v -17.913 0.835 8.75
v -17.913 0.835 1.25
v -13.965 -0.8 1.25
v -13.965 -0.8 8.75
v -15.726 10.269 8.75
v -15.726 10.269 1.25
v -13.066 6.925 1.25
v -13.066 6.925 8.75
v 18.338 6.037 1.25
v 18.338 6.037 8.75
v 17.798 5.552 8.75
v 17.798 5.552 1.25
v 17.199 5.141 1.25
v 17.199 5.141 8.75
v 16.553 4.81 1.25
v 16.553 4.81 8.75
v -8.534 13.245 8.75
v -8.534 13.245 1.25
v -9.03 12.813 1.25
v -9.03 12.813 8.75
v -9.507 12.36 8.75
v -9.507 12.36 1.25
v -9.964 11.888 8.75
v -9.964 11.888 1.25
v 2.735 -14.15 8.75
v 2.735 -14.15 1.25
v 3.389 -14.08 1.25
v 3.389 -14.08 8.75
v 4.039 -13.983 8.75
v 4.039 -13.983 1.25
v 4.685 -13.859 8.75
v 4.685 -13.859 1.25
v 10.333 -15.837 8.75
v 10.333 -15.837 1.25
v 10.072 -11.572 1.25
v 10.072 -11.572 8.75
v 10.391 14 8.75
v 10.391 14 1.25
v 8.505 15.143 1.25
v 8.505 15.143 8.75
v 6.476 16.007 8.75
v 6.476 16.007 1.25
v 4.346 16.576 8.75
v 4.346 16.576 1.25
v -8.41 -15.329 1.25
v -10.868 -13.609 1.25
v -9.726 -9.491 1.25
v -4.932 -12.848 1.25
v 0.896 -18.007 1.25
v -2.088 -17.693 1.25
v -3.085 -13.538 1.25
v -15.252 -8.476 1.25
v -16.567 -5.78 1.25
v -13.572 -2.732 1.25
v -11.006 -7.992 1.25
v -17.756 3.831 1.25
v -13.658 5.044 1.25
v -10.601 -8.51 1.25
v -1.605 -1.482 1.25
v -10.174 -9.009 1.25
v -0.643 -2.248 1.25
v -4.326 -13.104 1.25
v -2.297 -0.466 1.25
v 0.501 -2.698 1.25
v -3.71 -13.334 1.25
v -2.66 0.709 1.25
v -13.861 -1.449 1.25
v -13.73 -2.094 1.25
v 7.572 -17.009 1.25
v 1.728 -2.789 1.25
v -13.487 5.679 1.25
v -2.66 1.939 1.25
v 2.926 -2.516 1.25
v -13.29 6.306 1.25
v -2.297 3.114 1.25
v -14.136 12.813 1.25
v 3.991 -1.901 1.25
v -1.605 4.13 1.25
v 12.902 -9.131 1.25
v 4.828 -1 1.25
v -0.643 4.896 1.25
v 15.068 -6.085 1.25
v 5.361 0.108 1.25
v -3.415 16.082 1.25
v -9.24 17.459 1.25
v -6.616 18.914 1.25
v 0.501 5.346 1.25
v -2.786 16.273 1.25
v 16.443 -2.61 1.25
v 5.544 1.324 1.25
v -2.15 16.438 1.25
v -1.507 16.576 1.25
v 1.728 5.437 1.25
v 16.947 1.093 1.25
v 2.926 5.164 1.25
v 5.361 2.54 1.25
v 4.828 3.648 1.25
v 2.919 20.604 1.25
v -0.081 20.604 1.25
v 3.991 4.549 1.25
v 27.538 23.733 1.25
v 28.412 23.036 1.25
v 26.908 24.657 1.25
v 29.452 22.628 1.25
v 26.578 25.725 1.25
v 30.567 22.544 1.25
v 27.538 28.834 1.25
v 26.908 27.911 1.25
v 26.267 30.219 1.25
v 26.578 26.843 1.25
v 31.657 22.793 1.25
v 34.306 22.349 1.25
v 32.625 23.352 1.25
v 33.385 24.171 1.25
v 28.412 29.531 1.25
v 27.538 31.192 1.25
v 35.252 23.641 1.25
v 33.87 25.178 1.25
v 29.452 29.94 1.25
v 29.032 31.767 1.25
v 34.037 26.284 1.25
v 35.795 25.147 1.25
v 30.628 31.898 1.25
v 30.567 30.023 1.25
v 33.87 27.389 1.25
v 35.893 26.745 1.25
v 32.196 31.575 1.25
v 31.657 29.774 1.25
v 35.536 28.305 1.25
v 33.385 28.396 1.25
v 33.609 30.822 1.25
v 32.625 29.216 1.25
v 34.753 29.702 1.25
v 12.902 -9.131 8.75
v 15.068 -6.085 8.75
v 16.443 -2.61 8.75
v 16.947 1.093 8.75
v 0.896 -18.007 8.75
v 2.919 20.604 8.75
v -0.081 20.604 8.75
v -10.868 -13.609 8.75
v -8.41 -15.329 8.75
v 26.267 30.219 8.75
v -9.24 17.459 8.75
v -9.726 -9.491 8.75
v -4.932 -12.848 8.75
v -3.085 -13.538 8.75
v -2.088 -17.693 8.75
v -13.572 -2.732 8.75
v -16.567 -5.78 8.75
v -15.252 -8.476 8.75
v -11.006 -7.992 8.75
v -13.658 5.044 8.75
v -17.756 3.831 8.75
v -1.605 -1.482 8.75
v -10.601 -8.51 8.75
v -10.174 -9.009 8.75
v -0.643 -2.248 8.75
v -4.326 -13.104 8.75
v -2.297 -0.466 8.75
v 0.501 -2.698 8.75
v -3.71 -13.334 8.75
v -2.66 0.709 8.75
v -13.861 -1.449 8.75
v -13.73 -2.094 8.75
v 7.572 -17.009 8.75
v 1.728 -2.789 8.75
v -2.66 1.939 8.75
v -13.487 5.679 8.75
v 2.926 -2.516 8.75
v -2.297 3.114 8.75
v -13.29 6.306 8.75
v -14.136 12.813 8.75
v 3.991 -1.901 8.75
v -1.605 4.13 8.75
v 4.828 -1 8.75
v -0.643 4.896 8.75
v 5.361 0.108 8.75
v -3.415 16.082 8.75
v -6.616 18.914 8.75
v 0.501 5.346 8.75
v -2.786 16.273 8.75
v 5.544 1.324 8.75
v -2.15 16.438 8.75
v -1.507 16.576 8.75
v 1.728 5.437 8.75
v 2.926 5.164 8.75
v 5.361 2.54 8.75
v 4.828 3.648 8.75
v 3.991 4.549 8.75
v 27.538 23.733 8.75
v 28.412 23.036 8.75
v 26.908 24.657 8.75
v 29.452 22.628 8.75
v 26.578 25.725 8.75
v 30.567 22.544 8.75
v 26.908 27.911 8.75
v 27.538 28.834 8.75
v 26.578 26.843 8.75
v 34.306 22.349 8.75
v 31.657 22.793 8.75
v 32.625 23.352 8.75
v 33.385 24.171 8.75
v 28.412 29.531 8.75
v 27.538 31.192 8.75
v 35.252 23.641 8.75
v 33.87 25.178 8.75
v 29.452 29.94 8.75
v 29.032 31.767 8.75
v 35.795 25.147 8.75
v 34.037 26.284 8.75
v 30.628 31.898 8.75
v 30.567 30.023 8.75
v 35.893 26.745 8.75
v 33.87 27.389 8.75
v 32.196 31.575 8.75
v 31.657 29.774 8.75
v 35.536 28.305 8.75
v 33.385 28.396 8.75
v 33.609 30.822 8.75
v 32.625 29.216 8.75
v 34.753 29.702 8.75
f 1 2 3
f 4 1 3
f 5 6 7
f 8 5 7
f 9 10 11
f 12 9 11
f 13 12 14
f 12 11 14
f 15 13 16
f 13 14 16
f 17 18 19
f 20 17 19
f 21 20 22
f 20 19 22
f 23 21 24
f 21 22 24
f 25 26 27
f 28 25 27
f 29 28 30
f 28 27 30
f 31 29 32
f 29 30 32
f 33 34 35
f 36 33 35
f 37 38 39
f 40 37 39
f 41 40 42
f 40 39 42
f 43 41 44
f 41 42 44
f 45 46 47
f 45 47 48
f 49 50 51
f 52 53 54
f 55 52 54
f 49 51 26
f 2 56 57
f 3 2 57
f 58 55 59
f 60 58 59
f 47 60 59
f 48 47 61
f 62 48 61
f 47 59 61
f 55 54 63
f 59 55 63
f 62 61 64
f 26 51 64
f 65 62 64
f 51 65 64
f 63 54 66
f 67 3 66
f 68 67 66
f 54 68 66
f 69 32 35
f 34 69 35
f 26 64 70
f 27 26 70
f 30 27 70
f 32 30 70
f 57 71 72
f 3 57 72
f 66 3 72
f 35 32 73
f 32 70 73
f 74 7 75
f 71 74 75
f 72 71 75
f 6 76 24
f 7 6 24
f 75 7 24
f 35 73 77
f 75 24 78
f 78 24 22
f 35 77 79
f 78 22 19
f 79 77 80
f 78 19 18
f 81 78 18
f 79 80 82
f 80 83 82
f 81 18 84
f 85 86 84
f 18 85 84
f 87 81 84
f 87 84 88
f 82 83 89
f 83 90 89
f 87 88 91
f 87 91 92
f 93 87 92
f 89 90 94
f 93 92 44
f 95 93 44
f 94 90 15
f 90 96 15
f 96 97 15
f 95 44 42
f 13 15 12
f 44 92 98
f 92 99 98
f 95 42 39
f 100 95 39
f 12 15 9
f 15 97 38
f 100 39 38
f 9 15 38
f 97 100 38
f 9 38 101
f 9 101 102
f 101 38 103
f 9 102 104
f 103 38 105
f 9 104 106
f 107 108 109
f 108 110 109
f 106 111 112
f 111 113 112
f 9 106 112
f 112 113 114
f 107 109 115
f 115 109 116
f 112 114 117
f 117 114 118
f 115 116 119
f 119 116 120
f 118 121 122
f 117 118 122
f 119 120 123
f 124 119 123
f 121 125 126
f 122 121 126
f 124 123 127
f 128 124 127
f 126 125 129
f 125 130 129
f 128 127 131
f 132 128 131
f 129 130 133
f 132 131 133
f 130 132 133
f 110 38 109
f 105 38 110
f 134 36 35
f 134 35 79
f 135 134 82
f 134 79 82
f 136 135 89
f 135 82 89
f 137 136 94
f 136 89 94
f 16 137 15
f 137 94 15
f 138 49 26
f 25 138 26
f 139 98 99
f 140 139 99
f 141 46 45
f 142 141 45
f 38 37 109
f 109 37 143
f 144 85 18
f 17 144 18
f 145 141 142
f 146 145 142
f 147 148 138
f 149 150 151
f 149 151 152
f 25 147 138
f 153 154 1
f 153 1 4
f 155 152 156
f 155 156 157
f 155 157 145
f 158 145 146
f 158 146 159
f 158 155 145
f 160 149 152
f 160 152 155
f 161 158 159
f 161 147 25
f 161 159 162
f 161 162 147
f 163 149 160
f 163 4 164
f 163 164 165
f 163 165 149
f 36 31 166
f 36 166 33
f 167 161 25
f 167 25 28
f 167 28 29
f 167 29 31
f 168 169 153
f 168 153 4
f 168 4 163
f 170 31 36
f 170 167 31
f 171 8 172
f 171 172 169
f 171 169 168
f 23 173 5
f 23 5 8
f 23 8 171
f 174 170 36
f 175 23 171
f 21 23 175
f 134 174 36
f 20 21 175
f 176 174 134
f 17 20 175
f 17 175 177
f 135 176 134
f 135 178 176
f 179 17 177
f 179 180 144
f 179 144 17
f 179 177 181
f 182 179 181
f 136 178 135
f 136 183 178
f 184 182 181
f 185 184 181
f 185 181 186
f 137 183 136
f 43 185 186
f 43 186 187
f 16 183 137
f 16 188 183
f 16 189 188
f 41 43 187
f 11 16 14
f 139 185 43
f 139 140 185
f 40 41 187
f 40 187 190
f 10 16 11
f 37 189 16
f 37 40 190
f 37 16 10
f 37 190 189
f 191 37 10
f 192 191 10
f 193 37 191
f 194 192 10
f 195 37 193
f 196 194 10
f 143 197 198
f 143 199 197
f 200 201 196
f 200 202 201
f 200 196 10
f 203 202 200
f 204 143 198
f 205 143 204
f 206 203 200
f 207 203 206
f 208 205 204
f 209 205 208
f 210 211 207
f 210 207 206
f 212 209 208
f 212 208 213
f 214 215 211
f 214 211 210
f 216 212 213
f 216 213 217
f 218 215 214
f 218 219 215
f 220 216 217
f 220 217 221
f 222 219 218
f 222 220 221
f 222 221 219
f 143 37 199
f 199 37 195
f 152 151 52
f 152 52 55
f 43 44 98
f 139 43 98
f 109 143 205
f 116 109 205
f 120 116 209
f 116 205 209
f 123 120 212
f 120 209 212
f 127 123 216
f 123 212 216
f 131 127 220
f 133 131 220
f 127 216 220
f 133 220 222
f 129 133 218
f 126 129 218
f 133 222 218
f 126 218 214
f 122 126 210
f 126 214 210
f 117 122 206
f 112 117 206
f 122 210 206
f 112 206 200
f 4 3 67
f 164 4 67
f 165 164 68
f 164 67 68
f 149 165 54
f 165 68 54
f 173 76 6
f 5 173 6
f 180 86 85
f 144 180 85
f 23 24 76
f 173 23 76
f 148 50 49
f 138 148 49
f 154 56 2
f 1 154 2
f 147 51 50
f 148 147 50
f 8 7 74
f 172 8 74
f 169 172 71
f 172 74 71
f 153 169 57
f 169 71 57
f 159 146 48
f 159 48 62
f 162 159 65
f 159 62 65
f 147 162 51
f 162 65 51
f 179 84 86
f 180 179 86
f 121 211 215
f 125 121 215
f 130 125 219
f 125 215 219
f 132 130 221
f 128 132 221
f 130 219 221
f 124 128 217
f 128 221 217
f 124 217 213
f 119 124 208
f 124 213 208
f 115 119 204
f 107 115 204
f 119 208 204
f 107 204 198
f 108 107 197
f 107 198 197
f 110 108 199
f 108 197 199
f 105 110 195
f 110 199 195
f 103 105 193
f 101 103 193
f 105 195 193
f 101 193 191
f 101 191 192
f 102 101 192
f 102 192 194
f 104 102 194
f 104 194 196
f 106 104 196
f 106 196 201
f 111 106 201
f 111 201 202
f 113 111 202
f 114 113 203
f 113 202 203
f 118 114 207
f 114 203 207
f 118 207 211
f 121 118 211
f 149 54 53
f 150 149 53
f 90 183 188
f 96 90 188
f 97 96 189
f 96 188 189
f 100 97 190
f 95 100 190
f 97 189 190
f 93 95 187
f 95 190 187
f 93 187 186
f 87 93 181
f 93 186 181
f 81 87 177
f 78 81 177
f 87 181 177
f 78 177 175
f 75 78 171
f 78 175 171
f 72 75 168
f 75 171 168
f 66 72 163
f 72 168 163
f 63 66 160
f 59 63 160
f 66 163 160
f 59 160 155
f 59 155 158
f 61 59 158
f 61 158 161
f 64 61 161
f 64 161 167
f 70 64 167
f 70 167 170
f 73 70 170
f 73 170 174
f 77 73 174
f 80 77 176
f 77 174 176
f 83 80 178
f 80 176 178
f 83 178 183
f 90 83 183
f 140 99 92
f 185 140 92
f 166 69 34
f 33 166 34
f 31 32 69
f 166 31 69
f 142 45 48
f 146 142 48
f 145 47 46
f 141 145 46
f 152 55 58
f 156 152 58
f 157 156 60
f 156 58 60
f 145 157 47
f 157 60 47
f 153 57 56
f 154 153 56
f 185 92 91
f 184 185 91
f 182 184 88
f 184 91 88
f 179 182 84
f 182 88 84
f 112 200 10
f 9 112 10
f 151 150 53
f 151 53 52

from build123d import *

# Parameters (mm, degrees)
CROQUIS1_R               = 5
SALIENTE_EXTRUIR5_DEPTH  = 10
MATRIZC4_COUNT           = 8
MATRIZC4_ANGLE           = 203
CROQUIS9_R               = 5
SALIENTE_EXTRUIR6_DEPTH  = 10
SALIENTE_EXTRUIR7_START  = -10
CROQUIS11_R              = 5
SALIENTE_EXTRUIR7_DEPTH  = 10
CORTAR_EXTRUIR2_DEPTH    = 10
SALIENTE_EXTRUIR9_DEPTH  = 10
CROQUIS15_R              = 6
CORTAR_EXTRUIR4_DEPTH    = 10
ESCALA1_SCALE            = 0.75
CROQUIS16_R              = 4.5
CROQUIS16_R_2            = 4.125
SALIENTE_EXTRUIR12_DEPTH = 7.5


with BuildPart() as part:
    # Croquis1 → Saliente-Extruir5 (new body)
    with BuildSketch(Plane.XY):
        with BuildLine():
            Line((-2, 25.706379875), (-3.901693271, 20.335460584))
            ThreePointArc((-3.901693271, 20.335460584), (0, -20.706379875), (3.901693271, 20.335460584))
            Line((3.901693271, 20.335460584), (2, 25.706379875))
            Line((2, 25.706379875), (-2, 25.706379875))
        make_face()
        Circle(CROQUIS1_R, mode=Mode.SUBTRACT)
    saliente_extruir5 = extrude(amount=SALIENTE_EXTRUIR5_DEPTH)

    # MatrizC4: Saliente-Extruir5 ×8 about axis
    matrizc4_axis = Axis((0, 0, 0), (0, 0, 1))
    for i in range(1, MATRIZC4_COUNT):
        add(saliente_extruir5.rotate(matrizc4_axis, i * MATRIZC4_ANGLE / (MATRIZC4_COUNT - 1)))

    # Croquis9 → Saliente-Extruir6 (add)
    with BuildSketch(Plane.XY.offset(10)):
        with BuildLine():
            Line((11.839442553, 16.776986757), (33.130186467, 38.526068093))
            ThreePointArc((33.130186467, 38.526068093), (43.736186818, 38.639012949), (43.849131674, 28.033012597))
            Line((43.849131674, 28.033012597), (22.558387761, 6.283931261))
            ThreePointArc((22.558387761, 6.283931261), (11.952387409, 6.170986405), (11.839442553, 16.776986757))
        make_face()
        with Locations((38.48965907, 33.279540345)):
            Circle(CROQUIS9_R, mode=Mode.SUBTRACT)
    extrude(amount=-SALIENTE_EXTRUIR6_DEPTH)

    # Croquis11 → Saliente-Extruir7 (add)
    with BuildSketch(Plane.XY.offset(10).offset(SALIENTE_EXTRUIR7_START)):
        Circle(CROQUIS11_R)
    extrude(amount=SALIENTE_EXTRUIR7_DEPTH)

    # Croquis12 → Cortar-Extruir2 (cut)
    with BuildSketch(Plane.XY.offset(10)):
        with BuildLine():
            ThreePointArc((-3.771236166, 4.666666667), (0, -6), (3.771236166, 4.666666667))
            ThreePointArc((3.771236166, 4.666666667), (0, 10), (-3.771236166, 4.666666667))
        make_face()
    extrude(amount=-CORTAR_EXTRUIR2_DEPTH, mode=Mode.SUBTRACT)

    # Croquis13 → Saliente-Extruir9 (add)
    with BuildSketch(Plane.XY.offset(10)):
        with BuildLine():
            ThreePointArc((3.771236166, 4.666666667), (0, 10), (-3.771236166, 4.666666667))
            ThreePointArc((-3.771236166, 4.666666667), (0, -6), (3.771236166, 4.666666667))
        make_face()
    extrude(amount=-SALIENTE_EXTRUIR9_DEPTH)

    # Croquis15 → Cortar-Extruir4 (cut)
    with BuildSketch(Plane.XY.offset(10)):
        Circle(CROQUIS15_R)
    extrude(amount=-CORTAR_EXTRUIR4_DEPTH, mode=Mode.SUBTRACT)


with BuildPart() as part_1:
    # Escala1: scaled about (5.677071508, 5.296040102, 5)
    add(part.part.scale(ESCALA1_SCALE).moved(Location((1.419267877, 1.324010026, 1.25))))

    # Croquis16 → Saliente-Extruir12 (add)
    with BuildSketch(Plane.XY.offset(8.75)):
        with Locations((1.419267877, 1.324010026)):
            Circle(CROQUIS16_R)
        with Locations((1.419267877, 1.324010026)):
            Circle(CROQUIS16_R_2, mode=Mode.SUBTRACT)
    extrude(amount=-SALIENTE_EXTRUIR12_DEPTH)


solid = part_1.part
